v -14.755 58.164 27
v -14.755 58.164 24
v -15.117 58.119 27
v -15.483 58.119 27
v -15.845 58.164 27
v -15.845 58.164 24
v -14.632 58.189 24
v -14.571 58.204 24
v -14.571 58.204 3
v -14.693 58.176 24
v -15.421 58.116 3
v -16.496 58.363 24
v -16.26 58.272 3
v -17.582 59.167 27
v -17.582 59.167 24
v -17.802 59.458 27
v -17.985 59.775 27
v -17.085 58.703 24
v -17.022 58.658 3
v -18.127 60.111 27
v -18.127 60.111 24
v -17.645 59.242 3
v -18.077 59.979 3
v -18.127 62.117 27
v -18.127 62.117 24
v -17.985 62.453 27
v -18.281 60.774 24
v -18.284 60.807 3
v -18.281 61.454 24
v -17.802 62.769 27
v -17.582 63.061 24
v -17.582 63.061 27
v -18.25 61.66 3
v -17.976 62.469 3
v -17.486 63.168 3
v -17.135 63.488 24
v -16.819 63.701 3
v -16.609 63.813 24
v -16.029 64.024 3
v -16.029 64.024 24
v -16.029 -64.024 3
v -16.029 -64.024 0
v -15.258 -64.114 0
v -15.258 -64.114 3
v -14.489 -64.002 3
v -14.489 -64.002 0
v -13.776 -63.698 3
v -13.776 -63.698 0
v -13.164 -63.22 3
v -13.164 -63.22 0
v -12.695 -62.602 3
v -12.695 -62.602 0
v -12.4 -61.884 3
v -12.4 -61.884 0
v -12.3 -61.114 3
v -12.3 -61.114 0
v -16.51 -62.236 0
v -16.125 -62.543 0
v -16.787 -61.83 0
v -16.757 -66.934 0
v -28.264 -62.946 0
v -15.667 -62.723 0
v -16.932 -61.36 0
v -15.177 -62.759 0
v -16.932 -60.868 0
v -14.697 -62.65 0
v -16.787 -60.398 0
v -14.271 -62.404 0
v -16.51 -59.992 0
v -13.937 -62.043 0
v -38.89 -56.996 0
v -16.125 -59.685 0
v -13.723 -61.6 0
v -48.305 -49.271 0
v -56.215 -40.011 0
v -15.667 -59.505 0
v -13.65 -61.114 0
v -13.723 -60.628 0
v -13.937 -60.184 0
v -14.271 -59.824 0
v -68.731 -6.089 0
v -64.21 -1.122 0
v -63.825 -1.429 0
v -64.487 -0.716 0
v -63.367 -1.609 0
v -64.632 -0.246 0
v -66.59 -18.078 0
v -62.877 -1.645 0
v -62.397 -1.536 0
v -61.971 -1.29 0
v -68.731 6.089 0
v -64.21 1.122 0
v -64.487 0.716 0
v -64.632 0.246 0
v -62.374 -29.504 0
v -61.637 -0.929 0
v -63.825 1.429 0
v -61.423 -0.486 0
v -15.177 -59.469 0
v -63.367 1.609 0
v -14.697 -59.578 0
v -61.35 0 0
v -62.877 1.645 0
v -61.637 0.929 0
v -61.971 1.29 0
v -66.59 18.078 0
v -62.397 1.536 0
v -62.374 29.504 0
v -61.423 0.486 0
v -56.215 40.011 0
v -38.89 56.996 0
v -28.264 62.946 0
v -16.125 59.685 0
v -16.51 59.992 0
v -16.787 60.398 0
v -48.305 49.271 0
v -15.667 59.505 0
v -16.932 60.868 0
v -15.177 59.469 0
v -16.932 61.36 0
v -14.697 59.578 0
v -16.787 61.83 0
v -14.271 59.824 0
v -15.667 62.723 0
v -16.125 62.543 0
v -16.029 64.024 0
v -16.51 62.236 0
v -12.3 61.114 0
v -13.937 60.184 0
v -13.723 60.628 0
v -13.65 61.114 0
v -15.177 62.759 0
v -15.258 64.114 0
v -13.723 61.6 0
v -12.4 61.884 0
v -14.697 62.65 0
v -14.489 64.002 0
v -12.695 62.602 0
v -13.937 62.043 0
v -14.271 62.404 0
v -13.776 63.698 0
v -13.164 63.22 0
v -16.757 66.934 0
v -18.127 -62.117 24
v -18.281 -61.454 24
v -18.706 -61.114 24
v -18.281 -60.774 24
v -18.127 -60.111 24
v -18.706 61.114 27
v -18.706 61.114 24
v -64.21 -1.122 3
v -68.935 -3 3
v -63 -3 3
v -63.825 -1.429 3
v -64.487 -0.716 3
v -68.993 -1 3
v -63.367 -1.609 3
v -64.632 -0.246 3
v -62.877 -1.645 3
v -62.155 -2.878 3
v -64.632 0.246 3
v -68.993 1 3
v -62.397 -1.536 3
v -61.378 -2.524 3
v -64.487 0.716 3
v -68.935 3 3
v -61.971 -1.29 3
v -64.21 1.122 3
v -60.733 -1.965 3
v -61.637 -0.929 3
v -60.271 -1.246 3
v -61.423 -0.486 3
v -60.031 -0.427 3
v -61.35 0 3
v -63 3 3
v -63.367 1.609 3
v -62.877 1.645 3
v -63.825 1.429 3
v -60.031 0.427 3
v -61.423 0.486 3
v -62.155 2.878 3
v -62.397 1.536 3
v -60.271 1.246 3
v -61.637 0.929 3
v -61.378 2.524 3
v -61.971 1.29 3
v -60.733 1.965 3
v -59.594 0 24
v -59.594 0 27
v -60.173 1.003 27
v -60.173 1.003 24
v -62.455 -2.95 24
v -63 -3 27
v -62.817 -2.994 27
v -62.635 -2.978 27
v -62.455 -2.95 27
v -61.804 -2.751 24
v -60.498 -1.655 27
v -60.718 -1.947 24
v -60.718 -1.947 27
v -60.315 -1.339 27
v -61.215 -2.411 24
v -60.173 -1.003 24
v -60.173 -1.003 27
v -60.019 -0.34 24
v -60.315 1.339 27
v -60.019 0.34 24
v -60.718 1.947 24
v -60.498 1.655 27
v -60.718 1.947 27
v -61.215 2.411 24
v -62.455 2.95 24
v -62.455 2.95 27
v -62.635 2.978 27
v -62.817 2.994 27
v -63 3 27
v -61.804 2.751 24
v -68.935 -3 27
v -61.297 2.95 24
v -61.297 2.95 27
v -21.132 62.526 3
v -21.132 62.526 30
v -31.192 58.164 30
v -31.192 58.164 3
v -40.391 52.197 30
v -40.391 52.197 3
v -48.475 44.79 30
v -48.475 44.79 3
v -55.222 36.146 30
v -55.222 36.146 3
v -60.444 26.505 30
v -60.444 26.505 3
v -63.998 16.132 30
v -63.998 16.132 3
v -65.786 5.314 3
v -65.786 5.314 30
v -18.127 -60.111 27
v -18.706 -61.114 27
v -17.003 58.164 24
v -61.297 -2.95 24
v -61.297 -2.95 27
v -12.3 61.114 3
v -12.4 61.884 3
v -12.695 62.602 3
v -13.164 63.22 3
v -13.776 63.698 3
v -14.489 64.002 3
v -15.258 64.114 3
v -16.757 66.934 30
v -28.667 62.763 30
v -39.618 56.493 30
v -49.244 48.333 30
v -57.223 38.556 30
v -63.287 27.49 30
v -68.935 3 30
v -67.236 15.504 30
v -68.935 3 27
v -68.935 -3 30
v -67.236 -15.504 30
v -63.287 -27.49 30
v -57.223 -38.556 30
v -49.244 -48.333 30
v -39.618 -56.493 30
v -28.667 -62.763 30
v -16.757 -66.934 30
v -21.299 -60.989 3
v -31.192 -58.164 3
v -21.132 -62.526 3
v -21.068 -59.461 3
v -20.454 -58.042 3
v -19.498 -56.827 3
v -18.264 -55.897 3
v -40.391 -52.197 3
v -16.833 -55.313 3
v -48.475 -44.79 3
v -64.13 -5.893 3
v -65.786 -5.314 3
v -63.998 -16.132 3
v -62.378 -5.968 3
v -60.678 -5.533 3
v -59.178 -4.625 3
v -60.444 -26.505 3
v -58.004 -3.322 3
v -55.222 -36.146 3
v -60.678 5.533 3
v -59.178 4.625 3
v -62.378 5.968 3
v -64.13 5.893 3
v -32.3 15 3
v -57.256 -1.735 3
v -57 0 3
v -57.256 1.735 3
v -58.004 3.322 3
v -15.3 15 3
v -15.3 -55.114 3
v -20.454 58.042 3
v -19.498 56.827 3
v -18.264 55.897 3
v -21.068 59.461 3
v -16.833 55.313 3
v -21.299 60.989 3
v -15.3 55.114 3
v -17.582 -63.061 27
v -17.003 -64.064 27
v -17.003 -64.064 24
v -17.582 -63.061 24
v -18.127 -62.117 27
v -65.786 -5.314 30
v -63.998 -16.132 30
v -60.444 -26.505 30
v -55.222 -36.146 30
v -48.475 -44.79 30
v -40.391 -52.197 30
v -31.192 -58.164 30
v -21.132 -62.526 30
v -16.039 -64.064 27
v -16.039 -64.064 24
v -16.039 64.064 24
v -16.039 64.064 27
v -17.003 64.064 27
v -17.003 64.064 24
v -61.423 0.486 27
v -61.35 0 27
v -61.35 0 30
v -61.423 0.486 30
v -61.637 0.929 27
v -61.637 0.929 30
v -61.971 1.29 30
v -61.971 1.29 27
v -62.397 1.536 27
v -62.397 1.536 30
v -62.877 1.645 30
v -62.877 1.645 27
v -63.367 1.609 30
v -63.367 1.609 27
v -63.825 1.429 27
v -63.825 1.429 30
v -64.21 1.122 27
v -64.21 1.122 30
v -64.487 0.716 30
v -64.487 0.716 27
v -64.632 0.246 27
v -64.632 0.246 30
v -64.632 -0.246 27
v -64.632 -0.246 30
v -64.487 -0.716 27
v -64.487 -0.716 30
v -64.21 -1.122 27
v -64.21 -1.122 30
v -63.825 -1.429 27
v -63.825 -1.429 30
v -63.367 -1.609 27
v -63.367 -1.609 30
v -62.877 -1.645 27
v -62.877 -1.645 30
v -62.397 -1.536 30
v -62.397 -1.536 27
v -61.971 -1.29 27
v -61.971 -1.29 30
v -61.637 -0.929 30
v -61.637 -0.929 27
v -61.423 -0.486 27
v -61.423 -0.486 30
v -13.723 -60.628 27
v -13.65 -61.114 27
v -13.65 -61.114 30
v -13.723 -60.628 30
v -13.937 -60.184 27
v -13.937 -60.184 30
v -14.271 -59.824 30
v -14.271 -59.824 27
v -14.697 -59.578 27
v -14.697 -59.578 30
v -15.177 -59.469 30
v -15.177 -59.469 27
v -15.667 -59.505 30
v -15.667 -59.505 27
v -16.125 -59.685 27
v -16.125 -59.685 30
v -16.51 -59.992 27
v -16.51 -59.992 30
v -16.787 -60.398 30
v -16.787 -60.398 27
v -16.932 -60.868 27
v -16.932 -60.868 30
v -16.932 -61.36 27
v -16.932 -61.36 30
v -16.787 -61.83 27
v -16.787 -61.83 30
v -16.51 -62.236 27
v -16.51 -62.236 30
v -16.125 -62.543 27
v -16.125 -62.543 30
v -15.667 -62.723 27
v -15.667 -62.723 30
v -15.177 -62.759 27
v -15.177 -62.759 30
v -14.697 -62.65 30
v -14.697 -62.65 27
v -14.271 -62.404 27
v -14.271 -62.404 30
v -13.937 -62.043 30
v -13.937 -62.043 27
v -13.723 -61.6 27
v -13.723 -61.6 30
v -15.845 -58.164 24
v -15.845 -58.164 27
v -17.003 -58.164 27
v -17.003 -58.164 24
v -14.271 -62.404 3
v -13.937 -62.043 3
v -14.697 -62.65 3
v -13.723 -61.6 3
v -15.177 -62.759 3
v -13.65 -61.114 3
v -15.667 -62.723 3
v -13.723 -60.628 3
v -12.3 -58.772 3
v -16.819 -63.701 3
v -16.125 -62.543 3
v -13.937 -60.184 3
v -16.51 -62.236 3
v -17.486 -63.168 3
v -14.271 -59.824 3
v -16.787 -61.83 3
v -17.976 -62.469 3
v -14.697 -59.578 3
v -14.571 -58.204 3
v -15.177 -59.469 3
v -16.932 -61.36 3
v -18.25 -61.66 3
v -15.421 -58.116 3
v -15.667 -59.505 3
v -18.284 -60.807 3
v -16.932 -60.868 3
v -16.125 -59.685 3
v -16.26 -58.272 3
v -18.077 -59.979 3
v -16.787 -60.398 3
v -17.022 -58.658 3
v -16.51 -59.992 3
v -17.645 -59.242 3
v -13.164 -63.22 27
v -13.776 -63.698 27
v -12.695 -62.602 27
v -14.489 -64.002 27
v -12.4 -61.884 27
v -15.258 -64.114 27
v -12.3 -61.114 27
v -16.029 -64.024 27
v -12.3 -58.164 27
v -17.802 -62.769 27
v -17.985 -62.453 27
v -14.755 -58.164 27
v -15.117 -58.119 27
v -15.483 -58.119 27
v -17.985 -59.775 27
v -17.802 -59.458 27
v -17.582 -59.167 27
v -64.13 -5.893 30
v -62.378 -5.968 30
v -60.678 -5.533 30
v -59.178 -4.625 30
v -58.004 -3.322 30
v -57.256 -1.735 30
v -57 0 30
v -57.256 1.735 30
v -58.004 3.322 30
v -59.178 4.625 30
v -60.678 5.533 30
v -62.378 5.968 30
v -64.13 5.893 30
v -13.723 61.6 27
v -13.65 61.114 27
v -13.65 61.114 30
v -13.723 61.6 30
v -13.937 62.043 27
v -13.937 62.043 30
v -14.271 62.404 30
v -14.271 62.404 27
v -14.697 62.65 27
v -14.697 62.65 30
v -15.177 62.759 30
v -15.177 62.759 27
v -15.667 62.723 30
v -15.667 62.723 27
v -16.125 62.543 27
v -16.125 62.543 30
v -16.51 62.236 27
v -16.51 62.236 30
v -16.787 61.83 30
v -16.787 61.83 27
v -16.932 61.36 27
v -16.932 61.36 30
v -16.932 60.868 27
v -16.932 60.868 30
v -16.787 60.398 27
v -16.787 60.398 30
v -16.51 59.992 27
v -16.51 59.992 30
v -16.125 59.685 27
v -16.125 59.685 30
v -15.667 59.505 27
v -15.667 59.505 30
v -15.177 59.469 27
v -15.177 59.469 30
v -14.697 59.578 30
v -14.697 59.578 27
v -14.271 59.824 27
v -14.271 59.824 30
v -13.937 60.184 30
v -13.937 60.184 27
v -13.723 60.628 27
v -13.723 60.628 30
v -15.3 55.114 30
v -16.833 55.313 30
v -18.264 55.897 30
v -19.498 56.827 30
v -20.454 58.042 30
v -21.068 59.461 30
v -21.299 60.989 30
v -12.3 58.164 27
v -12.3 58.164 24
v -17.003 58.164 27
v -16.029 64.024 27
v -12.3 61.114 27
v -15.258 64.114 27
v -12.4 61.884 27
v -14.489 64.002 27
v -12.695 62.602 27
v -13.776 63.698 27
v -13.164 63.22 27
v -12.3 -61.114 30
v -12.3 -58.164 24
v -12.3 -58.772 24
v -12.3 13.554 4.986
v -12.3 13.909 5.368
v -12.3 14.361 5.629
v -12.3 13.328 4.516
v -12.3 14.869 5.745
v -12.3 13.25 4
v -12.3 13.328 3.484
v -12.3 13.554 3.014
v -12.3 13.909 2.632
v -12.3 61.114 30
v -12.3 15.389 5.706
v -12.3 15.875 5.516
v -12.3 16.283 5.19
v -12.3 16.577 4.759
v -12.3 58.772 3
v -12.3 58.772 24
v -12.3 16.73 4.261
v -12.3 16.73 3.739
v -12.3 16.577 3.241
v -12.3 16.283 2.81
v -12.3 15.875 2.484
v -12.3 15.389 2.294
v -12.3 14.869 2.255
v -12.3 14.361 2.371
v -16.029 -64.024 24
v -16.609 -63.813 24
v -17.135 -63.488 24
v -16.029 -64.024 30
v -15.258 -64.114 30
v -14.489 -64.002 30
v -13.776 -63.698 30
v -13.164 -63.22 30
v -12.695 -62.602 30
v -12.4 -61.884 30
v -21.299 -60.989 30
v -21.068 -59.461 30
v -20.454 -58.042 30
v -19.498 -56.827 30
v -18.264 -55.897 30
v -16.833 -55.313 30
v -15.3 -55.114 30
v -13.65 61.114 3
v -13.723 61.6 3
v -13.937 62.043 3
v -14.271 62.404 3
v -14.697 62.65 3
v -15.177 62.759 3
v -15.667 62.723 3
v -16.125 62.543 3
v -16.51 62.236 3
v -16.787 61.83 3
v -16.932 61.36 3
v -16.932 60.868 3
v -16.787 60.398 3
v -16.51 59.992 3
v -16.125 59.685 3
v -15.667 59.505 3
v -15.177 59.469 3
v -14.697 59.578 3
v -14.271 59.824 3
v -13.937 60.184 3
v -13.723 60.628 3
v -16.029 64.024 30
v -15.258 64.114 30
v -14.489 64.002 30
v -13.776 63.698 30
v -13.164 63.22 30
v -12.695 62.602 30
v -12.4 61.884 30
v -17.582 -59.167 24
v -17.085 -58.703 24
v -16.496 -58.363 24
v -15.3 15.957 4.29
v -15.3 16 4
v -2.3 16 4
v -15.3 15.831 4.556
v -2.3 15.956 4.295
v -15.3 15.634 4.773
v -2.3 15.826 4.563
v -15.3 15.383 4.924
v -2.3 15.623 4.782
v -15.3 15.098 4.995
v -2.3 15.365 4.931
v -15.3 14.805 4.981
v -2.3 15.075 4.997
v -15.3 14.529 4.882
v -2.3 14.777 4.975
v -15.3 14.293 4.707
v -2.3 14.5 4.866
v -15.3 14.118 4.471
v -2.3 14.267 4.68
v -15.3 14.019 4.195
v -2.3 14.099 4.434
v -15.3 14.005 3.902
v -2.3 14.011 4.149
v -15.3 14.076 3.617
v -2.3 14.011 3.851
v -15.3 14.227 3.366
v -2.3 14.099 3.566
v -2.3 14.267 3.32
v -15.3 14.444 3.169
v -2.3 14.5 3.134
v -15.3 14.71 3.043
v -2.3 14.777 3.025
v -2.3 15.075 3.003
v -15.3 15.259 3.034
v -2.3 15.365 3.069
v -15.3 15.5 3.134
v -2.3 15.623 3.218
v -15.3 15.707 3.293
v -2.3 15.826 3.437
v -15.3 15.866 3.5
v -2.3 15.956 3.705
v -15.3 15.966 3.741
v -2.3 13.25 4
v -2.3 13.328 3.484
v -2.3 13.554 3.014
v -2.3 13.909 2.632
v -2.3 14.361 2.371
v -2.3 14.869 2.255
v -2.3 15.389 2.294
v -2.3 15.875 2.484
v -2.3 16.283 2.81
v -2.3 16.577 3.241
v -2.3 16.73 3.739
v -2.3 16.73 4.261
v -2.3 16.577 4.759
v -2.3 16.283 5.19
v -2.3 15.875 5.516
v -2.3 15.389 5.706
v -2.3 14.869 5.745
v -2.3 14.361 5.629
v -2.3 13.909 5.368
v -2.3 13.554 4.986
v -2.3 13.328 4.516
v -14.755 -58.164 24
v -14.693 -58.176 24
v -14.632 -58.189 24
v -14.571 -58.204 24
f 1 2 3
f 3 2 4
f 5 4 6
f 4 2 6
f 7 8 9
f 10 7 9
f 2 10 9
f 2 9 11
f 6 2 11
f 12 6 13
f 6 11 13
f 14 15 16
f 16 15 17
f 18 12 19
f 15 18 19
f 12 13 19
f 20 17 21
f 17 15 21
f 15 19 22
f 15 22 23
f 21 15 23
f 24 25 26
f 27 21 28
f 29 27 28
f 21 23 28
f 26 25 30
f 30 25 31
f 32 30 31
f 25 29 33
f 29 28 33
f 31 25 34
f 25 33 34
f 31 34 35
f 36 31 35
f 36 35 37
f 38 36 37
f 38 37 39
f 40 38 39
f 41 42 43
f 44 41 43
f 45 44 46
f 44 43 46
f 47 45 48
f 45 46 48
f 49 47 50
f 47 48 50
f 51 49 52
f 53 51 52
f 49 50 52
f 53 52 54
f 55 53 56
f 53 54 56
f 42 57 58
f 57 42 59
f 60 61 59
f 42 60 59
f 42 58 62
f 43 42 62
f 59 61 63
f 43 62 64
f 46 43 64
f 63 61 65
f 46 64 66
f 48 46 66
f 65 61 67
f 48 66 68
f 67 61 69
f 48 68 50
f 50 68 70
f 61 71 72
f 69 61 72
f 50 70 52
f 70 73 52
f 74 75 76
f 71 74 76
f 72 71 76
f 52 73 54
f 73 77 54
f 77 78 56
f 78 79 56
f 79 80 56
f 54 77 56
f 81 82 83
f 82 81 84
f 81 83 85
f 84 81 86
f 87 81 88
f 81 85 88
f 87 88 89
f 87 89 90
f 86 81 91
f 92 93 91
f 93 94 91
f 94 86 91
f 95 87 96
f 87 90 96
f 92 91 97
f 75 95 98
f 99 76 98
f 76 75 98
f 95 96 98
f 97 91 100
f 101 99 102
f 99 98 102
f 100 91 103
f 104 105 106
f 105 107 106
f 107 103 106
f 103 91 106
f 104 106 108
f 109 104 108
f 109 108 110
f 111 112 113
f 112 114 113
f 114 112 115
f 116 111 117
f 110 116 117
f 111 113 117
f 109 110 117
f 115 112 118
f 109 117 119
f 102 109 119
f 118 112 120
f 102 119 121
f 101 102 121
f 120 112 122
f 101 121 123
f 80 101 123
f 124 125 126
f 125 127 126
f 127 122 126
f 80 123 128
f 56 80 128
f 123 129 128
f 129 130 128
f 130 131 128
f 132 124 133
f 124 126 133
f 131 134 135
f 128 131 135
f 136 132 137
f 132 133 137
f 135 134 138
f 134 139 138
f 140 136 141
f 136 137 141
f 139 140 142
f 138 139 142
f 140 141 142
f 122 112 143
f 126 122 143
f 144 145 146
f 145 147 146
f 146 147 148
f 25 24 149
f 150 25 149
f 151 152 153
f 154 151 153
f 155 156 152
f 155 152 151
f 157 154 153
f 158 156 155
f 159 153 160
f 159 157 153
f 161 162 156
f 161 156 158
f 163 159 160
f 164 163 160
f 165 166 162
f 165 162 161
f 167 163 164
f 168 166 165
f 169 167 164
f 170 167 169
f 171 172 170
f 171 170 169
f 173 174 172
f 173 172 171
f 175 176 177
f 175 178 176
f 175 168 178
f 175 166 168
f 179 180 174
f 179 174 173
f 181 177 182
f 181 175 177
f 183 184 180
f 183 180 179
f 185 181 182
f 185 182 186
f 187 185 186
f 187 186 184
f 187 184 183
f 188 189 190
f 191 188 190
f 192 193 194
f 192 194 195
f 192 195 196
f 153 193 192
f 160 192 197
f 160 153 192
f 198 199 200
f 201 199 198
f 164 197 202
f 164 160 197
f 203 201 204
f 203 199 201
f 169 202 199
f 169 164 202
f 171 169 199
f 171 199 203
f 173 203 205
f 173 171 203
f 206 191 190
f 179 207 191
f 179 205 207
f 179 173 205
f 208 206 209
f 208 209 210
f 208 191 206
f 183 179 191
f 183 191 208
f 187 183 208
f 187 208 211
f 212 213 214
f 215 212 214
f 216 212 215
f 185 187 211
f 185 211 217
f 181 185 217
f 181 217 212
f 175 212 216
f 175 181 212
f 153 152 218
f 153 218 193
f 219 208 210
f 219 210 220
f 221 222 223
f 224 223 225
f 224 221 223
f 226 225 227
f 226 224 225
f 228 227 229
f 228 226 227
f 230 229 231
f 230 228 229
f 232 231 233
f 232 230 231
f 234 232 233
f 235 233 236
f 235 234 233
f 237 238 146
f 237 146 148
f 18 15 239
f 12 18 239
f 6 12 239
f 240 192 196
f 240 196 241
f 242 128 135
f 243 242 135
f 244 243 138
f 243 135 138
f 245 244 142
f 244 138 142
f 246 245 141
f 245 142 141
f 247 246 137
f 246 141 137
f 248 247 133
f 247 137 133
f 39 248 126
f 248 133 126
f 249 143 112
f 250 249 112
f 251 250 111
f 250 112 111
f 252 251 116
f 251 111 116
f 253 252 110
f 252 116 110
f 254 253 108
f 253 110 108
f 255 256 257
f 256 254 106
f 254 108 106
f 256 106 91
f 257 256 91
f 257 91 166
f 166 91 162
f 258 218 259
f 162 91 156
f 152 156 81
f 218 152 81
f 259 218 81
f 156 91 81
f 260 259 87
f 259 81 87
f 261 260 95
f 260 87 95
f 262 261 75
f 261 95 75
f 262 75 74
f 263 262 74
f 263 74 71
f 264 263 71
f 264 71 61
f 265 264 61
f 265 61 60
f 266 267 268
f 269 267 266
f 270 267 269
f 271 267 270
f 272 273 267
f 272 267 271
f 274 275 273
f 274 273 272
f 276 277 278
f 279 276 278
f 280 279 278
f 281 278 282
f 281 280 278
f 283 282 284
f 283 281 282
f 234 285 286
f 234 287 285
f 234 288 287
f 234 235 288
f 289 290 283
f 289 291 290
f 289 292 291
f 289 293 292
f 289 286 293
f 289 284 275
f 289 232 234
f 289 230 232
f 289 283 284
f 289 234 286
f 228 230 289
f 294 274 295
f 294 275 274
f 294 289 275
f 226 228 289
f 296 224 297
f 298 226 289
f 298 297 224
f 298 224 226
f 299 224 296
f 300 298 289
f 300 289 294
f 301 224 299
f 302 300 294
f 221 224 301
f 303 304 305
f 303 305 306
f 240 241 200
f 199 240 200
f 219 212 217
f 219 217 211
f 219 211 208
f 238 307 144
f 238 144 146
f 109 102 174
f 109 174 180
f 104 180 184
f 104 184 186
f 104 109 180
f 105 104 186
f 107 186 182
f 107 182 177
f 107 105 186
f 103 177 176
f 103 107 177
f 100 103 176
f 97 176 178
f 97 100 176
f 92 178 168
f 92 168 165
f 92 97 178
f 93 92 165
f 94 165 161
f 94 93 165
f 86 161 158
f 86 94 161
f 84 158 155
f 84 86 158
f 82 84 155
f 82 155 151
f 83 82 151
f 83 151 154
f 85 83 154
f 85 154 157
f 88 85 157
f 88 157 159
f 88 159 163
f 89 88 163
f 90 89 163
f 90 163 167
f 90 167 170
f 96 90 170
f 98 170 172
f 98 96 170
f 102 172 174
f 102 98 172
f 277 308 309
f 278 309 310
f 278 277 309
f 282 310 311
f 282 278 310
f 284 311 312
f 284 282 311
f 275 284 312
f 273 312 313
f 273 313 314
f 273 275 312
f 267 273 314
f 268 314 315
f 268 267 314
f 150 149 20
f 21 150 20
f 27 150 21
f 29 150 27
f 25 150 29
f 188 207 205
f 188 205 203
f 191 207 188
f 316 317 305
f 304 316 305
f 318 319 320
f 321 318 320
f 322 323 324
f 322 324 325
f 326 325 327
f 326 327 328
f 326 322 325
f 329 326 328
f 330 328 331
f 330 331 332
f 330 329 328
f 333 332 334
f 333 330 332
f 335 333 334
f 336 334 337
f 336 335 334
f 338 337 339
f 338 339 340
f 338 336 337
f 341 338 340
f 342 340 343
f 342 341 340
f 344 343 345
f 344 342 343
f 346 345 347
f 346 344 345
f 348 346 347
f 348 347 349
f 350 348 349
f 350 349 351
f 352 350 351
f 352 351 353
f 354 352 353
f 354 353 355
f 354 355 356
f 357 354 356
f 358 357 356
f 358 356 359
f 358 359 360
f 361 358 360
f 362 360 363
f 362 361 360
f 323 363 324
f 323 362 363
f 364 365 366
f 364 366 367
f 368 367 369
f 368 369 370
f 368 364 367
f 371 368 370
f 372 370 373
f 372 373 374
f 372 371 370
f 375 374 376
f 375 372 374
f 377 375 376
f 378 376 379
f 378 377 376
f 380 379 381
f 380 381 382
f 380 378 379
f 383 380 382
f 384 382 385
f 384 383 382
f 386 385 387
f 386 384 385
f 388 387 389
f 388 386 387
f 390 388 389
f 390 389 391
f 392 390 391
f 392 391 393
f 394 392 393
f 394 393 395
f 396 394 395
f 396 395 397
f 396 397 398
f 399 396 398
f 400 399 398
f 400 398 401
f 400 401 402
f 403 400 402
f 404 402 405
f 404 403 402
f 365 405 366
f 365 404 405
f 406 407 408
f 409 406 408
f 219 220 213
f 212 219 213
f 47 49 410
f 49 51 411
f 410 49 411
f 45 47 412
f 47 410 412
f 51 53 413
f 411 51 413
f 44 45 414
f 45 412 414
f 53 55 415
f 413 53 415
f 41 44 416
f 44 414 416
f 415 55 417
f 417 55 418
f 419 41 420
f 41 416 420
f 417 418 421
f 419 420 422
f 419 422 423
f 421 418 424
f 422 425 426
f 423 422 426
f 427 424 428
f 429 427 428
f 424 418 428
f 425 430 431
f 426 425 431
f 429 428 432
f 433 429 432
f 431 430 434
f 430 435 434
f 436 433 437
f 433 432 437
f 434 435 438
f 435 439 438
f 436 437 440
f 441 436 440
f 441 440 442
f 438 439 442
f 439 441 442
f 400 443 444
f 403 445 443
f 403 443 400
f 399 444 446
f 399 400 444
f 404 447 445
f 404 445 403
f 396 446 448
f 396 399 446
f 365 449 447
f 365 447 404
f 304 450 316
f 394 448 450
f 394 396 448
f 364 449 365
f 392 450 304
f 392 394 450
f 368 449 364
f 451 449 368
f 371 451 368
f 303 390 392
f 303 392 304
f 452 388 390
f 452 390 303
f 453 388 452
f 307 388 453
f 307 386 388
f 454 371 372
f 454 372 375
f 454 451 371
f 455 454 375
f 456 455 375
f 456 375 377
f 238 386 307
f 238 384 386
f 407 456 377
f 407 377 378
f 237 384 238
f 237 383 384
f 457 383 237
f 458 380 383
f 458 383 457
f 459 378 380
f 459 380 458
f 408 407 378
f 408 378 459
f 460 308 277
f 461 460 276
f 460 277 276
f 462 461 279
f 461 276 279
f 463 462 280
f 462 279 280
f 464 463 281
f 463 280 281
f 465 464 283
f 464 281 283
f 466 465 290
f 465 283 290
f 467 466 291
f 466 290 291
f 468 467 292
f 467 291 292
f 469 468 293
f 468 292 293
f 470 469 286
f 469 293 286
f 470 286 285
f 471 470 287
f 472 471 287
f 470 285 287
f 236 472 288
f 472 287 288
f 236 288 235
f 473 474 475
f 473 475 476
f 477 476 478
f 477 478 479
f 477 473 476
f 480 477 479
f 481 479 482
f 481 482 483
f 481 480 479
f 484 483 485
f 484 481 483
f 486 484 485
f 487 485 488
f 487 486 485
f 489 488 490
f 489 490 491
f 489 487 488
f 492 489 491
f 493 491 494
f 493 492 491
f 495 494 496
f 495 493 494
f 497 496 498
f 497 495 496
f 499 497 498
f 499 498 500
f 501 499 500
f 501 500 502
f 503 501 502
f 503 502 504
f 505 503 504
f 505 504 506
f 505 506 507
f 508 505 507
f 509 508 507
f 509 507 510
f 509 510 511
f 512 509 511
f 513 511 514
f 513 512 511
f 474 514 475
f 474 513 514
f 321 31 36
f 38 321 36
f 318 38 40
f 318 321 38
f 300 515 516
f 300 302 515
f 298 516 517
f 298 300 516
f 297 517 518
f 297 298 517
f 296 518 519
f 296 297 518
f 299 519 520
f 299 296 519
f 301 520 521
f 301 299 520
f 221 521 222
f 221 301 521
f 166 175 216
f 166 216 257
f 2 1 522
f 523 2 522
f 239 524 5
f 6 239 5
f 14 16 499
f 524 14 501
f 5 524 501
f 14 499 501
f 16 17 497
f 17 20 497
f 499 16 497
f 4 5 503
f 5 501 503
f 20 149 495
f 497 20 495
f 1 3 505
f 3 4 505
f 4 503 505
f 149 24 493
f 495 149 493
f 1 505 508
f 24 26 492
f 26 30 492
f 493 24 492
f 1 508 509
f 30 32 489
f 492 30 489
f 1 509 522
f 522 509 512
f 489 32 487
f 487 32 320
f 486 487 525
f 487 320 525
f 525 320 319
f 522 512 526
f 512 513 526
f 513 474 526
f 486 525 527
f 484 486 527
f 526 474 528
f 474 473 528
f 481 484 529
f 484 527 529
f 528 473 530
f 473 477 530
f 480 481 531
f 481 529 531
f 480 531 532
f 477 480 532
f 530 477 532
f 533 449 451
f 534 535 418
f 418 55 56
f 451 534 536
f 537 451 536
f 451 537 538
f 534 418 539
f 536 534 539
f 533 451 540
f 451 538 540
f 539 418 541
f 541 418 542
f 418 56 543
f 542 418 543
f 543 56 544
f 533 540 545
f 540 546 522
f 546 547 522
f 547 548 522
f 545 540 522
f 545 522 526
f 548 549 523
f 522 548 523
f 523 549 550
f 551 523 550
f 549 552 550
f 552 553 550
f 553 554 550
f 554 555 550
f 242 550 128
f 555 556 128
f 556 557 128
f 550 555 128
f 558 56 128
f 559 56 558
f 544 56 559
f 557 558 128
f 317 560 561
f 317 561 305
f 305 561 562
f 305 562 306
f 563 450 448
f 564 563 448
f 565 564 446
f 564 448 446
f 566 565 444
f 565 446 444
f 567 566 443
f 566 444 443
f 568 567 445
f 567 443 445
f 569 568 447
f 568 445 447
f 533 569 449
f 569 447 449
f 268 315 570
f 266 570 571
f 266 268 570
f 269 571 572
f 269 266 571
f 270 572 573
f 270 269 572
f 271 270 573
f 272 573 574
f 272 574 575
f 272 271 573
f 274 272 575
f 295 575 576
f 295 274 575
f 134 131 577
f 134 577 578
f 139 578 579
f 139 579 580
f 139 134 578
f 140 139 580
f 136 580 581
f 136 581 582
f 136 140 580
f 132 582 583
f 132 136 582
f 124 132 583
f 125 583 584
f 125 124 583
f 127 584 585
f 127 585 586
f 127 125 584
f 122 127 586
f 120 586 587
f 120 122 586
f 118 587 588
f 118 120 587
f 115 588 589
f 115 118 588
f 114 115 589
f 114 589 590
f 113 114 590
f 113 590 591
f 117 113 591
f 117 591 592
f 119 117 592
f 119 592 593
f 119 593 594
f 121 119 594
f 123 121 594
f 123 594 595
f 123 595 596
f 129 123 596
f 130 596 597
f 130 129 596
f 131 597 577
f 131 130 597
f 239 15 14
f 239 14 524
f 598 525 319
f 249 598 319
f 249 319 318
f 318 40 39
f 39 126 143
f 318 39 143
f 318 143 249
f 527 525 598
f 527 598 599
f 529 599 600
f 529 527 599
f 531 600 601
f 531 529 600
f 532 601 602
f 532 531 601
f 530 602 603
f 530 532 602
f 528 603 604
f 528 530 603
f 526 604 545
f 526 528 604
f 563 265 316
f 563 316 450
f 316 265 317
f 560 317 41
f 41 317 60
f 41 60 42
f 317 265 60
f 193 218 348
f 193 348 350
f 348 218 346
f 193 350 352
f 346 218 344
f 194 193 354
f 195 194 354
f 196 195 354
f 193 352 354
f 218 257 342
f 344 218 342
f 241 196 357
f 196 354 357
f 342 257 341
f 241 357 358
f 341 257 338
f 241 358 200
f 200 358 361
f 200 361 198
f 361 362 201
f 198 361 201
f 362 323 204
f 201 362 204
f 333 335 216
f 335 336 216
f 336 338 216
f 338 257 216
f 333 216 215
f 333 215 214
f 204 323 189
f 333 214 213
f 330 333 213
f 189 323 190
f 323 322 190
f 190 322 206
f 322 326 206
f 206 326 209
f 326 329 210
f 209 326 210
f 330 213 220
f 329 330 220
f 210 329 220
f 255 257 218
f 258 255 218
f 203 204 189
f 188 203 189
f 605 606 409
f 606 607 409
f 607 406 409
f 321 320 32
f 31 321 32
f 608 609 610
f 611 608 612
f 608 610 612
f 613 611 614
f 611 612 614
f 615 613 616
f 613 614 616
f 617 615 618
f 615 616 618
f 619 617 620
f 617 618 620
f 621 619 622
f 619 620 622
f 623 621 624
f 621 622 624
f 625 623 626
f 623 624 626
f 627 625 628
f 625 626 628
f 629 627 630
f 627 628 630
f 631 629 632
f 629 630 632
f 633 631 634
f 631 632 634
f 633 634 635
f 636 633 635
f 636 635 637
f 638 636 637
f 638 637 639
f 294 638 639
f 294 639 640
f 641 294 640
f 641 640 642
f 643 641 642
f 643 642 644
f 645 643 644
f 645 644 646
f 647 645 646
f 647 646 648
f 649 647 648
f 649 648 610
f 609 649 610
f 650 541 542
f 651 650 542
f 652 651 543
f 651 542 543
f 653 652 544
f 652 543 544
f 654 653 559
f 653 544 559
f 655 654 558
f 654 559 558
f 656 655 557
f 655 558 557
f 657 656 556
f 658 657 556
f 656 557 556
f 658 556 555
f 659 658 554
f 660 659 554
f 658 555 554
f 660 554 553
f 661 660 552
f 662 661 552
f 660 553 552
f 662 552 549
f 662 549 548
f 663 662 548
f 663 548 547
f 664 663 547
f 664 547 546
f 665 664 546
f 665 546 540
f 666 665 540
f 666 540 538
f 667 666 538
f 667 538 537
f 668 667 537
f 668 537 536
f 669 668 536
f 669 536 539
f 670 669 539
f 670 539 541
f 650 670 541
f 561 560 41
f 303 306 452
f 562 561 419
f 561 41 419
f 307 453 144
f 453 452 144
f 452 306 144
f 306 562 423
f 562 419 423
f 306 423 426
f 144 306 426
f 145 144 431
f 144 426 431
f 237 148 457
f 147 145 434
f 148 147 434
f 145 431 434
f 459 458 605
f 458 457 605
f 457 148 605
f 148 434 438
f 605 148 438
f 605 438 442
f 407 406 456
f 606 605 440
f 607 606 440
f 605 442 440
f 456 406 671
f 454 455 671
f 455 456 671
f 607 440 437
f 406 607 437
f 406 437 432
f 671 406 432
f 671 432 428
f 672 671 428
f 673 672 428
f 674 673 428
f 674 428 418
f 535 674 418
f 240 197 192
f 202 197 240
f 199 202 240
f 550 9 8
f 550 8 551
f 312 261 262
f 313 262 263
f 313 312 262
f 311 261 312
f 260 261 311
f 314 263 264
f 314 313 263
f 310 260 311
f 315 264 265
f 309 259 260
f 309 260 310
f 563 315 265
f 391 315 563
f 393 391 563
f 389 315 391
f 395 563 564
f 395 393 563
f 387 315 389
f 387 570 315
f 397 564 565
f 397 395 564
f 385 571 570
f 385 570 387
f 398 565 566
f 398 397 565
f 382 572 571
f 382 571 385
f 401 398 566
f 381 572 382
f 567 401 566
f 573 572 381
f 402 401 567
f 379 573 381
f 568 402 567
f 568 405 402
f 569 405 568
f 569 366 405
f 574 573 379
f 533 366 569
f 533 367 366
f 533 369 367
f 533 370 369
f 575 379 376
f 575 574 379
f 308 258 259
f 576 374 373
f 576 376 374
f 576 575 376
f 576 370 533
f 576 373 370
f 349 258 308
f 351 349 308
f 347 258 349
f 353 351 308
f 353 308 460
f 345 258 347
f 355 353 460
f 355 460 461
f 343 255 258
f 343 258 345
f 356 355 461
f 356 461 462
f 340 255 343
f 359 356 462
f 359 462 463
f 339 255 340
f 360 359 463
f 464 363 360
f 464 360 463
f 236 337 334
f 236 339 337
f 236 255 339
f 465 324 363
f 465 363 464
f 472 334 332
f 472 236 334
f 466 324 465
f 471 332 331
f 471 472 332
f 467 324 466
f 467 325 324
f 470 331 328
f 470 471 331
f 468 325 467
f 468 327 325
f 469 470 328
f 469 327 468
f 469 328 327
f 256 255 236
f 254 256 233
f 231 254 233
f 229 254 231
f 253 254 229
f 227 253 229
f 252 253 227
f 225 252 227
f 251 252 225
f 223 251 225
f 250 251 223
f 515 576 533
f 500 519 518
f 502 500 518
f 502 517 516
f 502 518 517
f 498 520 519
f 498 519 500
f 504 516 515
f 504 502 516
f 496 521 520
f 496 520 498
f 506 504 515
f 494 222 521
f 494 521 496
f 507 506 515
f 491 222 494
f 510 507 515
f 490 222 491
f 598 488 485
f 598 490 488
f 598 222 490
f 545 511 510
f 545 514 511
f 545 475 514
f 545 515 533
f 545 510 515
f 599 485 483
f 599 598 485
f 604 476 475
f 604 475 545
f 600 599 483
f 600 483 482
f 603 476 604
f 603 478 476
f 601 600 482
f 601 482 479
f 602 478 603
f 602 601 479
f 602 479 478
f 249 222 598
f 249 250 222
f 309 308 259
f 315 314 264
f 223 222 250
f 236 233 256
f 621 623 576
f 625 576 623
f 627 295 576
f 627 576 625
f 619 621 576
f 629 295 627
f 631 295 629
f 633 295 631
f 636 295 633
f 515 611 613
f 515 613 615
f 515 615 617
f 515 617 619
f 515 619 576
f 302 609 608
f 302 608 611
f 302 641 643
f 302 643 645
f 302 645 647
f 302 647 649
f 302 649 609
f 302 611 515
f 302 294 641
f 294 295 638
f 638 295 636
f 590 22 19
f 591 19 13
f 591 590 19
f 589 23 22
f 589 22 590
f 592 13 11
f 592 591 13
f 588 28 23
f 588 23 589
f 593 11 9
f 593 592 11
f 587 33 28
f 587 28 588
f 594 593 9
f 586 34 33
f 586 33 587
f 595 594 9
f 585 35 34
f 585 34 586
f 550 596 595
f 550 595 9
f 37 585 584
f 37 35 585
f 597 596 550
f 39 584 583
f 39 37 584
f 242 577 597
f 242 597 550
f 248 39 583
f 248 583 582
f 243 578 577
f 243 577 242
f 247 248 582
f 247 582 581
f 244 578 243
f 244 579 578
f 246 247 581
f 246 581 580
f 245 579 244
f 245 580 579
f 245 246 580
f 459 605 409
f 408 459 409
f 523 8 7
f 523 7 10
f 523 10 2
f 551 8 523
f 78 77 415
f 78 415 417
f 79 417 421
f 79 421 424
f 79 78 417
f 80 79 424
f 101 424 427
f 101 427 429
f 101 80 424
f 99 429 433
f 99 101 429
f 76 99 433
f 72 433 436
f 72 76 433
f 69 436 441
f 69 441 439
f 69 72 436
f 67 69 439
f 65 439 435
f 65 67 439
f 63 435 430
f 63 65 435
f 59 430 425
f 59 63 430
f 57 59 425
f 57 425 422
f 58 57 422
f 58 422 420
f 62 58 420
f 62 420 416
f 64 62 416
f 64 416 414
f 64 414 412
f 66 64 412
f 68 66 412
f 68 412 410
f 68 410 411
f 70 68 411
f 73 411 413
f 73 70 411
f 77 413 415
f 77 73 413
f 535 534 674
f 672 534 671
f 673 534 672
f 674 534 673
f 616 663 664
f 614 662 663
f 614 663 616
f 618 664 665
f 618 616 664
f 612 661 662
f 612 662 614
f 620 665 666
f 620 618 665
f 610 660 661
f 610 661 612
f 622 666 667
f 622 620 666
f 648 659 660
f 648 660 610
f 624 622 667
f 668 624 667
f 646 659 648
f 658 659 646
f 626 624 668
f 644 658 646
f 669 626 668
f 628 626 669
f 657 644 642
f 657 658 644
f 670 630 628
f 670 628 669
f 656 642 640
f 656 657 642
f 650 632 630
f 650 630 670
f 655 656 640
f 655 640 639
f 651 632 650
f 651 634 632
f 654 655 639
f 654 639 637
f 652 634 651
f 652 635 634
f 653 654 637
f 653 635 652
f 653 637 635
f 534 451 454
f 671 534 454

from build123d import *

# Parameters (mm, degrees)
SKETCH1_R           = 3
BOSS_EXTRUDE2_DEPTH = 30
SHELL1_T            = -3
SKETCH3_R           = 1.75
BOSS_EXTRUDE3_DEPTH = 10
SKETCH5_R           = 1.65
BOSS_EXTRUDE4_DEPTH = 3
CUT_EXTRUDE1_START  = -27
CUT_EXTRUDE1_DEPTH  = 27
CUT_EXTRUDE2_START  = -3
CUT_EXTRUDE2_DEPTH  = 3
BOSS_EXTRUDE5_START = -3
SKETCH8_R           = 1.65
BOSS_EXTRUDE5_DEPTH = 3
SKETCH9_R           = 1
CUT_EXTRUDE3_DEPTH  = 30


with BuildPart() as part:
    # Sketch1 → Boss-Extrude2 (new body)
    with BuildSketch(Plane.XY):
        with BuildLine():
            Line((-12.3, -61.113910037), (-12.3, 61.113910037))
            ThreePointArc((-12.3, 61.113910037), (-17.145844754, 58.748987809), (-16.028571429, 64.024096229))
            Line((-16.028571429, 64.024096229), (-16.757142857, 66.934282421))
            ThreePointArc((-16.757142857, 66.934282421), (-69, 0), (-16.757142857, -66.934282421))
            Line((-16.757142857, -66.934282421), (-16.028571429, -64.024096229))
            ThreePointArc((-16.028571429, -64.024096229), (-17.145844754, -58.748987809), (-12.3, -61.113910037))
        make_face()
        with Locations((-63, 0)):
            Circle(SKETCH1_R, mode=Mode.SUBTRACT)
    extrude(amount=BOSS_EXTRUDE2_DEPTH)

    # Shell1
    shell1_openings = [part.faces().sort_by_distance(p)[0] for p in [
        (-36.229379507, 0, 30),
    ]]
    offset(amount=SHELL1_T, openings=shell1_openings)

    # Sketch3 → Boss-Extrude3 (add)
    with BuildSketch(Plane.YZ.offset(-12.3)):
        with Locations(Location((15, 4, 0), (0, 0, 180))):
            Circle(SKETCH3_R)
    extrude(amount=BOSS_EXTRUDE3_DEPTH)

    # Sketch5 → Boss-Extrude4 (add)
    with BuildSketch(Plane.XY):
        with BuildLine():
            Line((-12.3, -61.113910037), (-12.3, 61.113910037))
            ThreePointArc((-12.3, 61.113910037), (-13.454155246, 63.478832265), (-16.028571429, 64.024096229))
            Line((-16.028571429, 64.024096229), (-16.757142857, 66.934282421))
            ThreePointArc((-16.757142857, 66.934282421), (-69, 0), (-16.757142857, -66.934282421))
            Line((-16.757142857, -66.934282421), (-16.028571429, -64.024096229))
            ThreePointArc((-16.028571429, -64.024096229), (-13.454155246, -63.478832265), (-12.3, -61.113910037))
        make_face()
        with Locations((-63, 0)):
            Circle(SKETCH5_R, mode=Mode.SUBTRACT)
        with Locations((-15.3, 61.113910037)):
            Circle(SKETCH5_R, mode=Mode.SUBTRACT)
        with Locations((-15.3, -61.113910037)):
            Circle(SKETCH5_R, mode=Mode.SUBTRACT)
    extrude(amount=BOSS_EXTRUDE4_DEPTH)

    # Sketch6 → Cut-Extrude1 (cut)
    with BuildSketch(Plane.XY.offset(30).offset(CUT_EXTRUDE1_START)):
        with BuildLine():
            Line((-63, 3), (-68.934751758, 3))
            ThreePointArc((-68.934751758, 3), (-71.934751758, 0), (-68.934751758, -3))
            Line((-68.934751758, -3), (-63, -3))
            ThreePointArc((-63, -3), (-60, 0), (-63, 3))
        make_face()
        with BuildLine():
            Line((-14.571428571, -58.203723845), (-12.3, -58.772380917))
            Line((-12.3, -58.772380917), (-12.3, -61.113910037))
            ThreePointArc((-12.3, -61.113910037), (-12.935077772, -59.268065283), (-14.571428571, -58.203723845))
        make_face()
        with BuildLine():
            Line((-14.571428571, 58.203723845), (-12.3, 58.772380917))
            Line((-12.3, 58.772380917), (-12.3, 61.113910037))
            ThreePointArc((-12.3, 61.113910037), (-12.935077772, 59.268065283), (-14.571428571, 58.203723845))
        make_face()
    extrude(amount=CUT_EXTRUDE1_DEPTH, mode=Mode.SUBTRACT)

    # Sketch7 → Cut-Extrude2 (cut)
    with BuildSketch(Plane.XY.offset(30).offset(CUT_EXTRUDE2_START)):
        Polygon((-13.596816706, -58.163910037), (-11.893633412, -58.163910037), (-11.893633412, -61.113910037), (-13.596816706, -64.063910037), (-17.003183294, -64.063910037), (-18.706366588, -61.113910037), (-17.003183294, -58.163910037), align=None)
        Polygon((-11.893633412, 61.113910037), (-13.596816706, 64.063910037), (-17.003183294, 64.063910037), (-18.706366588, 61.113910037), (-17.003183294, 58.163910037), (-13.596816706, 58.163910037), (-11.893633412, 58.163910037), align=None)
        Polygon((-59.593633412, 0), (-61.296816706, 2.95), (-64.703183294, 2.95), (-66.406366588, 0), (-64.703183294, -2.95), (-61.296816706, -2.95), align=None)
    extrude(amount=-CUT_EXTRUDE2_DEPTH, mode=Mode.SUBTRACT)

    # Sketch8 → Boss-Extrude5 (add)
    # profile 1 of 3: a face of its own
    with BuildSketch(Plane.XY.offset(30).offset(BOSS_EXTRUDE5_START)):
        with BuildLine():
            Line((-63, 3), (-68.934751758, 3))
            Line((-68.934751758, 3), (-68.934751758, -3))
            Line((-68.934751758, -3), (-63, -3))
            ThreePointArc((-63, -3), (-60, 0), (-63, 3))
        make_face()
        with Locations((-63, 0)):
            Circle(SKETCH8_R, mode=Mode.SUBTRACT)
    # profile 2 of 3: a face of its own
    with BuildSketch(Plane.XY.offset(30).offset(BOSS_EXTRUDE5_START)):
        with BuildLine():
            Line((-12.3, -58.772380917), (-14.571428571, -58.203723845))
            ThreePointArc((-14.571428571, -58.203723845), (-17.664922228, -62.959754791), (-12.3, -61.113910037))
            Line((-12.3, -61.113910037), (-12.3, -58.772380917))
        make_face()
        with Locations((-15.3, -61.113910037)):
            Circle(SKETCH8_R, mode=Mode.SUBTRACT)
    # profile 3 of 3: a face of its own
    with BuildSketch(Plane.XY.offset(30).offset(BOSS_EXTRUDE5_START)):
        with BuildLine():
            Line((-12.3, 61.113910037), (-12.3, 58.772380917))
            Line((-12.3, 58.772380917), (-14.571428571, 58.203723845))
            ThreePointArc((-14.571428571, 58.203723845), (-17.664922228, 62.959754791), (-12.3, 61.113910037))
        make_face()
        with Locations((-15.3, 61.113910037)):
            Circle(SKETCH8_R, mode=Mode.SUBTRACT)
    extrude(amount=BOSS_EXTRUDE5_DEPTH)

    # Sketch9 → Cut-Extrude3 (cut)
    with BuildSketch(Plane.YZ.offset(-2.3)):
        with Locations((15, 4)):
            Circle(SKETCH9_R)
    extrude(amount=-CUT_EXTRUDE3_DEPTH, mode=Mode.SUBTRACT)


solid = part.part
